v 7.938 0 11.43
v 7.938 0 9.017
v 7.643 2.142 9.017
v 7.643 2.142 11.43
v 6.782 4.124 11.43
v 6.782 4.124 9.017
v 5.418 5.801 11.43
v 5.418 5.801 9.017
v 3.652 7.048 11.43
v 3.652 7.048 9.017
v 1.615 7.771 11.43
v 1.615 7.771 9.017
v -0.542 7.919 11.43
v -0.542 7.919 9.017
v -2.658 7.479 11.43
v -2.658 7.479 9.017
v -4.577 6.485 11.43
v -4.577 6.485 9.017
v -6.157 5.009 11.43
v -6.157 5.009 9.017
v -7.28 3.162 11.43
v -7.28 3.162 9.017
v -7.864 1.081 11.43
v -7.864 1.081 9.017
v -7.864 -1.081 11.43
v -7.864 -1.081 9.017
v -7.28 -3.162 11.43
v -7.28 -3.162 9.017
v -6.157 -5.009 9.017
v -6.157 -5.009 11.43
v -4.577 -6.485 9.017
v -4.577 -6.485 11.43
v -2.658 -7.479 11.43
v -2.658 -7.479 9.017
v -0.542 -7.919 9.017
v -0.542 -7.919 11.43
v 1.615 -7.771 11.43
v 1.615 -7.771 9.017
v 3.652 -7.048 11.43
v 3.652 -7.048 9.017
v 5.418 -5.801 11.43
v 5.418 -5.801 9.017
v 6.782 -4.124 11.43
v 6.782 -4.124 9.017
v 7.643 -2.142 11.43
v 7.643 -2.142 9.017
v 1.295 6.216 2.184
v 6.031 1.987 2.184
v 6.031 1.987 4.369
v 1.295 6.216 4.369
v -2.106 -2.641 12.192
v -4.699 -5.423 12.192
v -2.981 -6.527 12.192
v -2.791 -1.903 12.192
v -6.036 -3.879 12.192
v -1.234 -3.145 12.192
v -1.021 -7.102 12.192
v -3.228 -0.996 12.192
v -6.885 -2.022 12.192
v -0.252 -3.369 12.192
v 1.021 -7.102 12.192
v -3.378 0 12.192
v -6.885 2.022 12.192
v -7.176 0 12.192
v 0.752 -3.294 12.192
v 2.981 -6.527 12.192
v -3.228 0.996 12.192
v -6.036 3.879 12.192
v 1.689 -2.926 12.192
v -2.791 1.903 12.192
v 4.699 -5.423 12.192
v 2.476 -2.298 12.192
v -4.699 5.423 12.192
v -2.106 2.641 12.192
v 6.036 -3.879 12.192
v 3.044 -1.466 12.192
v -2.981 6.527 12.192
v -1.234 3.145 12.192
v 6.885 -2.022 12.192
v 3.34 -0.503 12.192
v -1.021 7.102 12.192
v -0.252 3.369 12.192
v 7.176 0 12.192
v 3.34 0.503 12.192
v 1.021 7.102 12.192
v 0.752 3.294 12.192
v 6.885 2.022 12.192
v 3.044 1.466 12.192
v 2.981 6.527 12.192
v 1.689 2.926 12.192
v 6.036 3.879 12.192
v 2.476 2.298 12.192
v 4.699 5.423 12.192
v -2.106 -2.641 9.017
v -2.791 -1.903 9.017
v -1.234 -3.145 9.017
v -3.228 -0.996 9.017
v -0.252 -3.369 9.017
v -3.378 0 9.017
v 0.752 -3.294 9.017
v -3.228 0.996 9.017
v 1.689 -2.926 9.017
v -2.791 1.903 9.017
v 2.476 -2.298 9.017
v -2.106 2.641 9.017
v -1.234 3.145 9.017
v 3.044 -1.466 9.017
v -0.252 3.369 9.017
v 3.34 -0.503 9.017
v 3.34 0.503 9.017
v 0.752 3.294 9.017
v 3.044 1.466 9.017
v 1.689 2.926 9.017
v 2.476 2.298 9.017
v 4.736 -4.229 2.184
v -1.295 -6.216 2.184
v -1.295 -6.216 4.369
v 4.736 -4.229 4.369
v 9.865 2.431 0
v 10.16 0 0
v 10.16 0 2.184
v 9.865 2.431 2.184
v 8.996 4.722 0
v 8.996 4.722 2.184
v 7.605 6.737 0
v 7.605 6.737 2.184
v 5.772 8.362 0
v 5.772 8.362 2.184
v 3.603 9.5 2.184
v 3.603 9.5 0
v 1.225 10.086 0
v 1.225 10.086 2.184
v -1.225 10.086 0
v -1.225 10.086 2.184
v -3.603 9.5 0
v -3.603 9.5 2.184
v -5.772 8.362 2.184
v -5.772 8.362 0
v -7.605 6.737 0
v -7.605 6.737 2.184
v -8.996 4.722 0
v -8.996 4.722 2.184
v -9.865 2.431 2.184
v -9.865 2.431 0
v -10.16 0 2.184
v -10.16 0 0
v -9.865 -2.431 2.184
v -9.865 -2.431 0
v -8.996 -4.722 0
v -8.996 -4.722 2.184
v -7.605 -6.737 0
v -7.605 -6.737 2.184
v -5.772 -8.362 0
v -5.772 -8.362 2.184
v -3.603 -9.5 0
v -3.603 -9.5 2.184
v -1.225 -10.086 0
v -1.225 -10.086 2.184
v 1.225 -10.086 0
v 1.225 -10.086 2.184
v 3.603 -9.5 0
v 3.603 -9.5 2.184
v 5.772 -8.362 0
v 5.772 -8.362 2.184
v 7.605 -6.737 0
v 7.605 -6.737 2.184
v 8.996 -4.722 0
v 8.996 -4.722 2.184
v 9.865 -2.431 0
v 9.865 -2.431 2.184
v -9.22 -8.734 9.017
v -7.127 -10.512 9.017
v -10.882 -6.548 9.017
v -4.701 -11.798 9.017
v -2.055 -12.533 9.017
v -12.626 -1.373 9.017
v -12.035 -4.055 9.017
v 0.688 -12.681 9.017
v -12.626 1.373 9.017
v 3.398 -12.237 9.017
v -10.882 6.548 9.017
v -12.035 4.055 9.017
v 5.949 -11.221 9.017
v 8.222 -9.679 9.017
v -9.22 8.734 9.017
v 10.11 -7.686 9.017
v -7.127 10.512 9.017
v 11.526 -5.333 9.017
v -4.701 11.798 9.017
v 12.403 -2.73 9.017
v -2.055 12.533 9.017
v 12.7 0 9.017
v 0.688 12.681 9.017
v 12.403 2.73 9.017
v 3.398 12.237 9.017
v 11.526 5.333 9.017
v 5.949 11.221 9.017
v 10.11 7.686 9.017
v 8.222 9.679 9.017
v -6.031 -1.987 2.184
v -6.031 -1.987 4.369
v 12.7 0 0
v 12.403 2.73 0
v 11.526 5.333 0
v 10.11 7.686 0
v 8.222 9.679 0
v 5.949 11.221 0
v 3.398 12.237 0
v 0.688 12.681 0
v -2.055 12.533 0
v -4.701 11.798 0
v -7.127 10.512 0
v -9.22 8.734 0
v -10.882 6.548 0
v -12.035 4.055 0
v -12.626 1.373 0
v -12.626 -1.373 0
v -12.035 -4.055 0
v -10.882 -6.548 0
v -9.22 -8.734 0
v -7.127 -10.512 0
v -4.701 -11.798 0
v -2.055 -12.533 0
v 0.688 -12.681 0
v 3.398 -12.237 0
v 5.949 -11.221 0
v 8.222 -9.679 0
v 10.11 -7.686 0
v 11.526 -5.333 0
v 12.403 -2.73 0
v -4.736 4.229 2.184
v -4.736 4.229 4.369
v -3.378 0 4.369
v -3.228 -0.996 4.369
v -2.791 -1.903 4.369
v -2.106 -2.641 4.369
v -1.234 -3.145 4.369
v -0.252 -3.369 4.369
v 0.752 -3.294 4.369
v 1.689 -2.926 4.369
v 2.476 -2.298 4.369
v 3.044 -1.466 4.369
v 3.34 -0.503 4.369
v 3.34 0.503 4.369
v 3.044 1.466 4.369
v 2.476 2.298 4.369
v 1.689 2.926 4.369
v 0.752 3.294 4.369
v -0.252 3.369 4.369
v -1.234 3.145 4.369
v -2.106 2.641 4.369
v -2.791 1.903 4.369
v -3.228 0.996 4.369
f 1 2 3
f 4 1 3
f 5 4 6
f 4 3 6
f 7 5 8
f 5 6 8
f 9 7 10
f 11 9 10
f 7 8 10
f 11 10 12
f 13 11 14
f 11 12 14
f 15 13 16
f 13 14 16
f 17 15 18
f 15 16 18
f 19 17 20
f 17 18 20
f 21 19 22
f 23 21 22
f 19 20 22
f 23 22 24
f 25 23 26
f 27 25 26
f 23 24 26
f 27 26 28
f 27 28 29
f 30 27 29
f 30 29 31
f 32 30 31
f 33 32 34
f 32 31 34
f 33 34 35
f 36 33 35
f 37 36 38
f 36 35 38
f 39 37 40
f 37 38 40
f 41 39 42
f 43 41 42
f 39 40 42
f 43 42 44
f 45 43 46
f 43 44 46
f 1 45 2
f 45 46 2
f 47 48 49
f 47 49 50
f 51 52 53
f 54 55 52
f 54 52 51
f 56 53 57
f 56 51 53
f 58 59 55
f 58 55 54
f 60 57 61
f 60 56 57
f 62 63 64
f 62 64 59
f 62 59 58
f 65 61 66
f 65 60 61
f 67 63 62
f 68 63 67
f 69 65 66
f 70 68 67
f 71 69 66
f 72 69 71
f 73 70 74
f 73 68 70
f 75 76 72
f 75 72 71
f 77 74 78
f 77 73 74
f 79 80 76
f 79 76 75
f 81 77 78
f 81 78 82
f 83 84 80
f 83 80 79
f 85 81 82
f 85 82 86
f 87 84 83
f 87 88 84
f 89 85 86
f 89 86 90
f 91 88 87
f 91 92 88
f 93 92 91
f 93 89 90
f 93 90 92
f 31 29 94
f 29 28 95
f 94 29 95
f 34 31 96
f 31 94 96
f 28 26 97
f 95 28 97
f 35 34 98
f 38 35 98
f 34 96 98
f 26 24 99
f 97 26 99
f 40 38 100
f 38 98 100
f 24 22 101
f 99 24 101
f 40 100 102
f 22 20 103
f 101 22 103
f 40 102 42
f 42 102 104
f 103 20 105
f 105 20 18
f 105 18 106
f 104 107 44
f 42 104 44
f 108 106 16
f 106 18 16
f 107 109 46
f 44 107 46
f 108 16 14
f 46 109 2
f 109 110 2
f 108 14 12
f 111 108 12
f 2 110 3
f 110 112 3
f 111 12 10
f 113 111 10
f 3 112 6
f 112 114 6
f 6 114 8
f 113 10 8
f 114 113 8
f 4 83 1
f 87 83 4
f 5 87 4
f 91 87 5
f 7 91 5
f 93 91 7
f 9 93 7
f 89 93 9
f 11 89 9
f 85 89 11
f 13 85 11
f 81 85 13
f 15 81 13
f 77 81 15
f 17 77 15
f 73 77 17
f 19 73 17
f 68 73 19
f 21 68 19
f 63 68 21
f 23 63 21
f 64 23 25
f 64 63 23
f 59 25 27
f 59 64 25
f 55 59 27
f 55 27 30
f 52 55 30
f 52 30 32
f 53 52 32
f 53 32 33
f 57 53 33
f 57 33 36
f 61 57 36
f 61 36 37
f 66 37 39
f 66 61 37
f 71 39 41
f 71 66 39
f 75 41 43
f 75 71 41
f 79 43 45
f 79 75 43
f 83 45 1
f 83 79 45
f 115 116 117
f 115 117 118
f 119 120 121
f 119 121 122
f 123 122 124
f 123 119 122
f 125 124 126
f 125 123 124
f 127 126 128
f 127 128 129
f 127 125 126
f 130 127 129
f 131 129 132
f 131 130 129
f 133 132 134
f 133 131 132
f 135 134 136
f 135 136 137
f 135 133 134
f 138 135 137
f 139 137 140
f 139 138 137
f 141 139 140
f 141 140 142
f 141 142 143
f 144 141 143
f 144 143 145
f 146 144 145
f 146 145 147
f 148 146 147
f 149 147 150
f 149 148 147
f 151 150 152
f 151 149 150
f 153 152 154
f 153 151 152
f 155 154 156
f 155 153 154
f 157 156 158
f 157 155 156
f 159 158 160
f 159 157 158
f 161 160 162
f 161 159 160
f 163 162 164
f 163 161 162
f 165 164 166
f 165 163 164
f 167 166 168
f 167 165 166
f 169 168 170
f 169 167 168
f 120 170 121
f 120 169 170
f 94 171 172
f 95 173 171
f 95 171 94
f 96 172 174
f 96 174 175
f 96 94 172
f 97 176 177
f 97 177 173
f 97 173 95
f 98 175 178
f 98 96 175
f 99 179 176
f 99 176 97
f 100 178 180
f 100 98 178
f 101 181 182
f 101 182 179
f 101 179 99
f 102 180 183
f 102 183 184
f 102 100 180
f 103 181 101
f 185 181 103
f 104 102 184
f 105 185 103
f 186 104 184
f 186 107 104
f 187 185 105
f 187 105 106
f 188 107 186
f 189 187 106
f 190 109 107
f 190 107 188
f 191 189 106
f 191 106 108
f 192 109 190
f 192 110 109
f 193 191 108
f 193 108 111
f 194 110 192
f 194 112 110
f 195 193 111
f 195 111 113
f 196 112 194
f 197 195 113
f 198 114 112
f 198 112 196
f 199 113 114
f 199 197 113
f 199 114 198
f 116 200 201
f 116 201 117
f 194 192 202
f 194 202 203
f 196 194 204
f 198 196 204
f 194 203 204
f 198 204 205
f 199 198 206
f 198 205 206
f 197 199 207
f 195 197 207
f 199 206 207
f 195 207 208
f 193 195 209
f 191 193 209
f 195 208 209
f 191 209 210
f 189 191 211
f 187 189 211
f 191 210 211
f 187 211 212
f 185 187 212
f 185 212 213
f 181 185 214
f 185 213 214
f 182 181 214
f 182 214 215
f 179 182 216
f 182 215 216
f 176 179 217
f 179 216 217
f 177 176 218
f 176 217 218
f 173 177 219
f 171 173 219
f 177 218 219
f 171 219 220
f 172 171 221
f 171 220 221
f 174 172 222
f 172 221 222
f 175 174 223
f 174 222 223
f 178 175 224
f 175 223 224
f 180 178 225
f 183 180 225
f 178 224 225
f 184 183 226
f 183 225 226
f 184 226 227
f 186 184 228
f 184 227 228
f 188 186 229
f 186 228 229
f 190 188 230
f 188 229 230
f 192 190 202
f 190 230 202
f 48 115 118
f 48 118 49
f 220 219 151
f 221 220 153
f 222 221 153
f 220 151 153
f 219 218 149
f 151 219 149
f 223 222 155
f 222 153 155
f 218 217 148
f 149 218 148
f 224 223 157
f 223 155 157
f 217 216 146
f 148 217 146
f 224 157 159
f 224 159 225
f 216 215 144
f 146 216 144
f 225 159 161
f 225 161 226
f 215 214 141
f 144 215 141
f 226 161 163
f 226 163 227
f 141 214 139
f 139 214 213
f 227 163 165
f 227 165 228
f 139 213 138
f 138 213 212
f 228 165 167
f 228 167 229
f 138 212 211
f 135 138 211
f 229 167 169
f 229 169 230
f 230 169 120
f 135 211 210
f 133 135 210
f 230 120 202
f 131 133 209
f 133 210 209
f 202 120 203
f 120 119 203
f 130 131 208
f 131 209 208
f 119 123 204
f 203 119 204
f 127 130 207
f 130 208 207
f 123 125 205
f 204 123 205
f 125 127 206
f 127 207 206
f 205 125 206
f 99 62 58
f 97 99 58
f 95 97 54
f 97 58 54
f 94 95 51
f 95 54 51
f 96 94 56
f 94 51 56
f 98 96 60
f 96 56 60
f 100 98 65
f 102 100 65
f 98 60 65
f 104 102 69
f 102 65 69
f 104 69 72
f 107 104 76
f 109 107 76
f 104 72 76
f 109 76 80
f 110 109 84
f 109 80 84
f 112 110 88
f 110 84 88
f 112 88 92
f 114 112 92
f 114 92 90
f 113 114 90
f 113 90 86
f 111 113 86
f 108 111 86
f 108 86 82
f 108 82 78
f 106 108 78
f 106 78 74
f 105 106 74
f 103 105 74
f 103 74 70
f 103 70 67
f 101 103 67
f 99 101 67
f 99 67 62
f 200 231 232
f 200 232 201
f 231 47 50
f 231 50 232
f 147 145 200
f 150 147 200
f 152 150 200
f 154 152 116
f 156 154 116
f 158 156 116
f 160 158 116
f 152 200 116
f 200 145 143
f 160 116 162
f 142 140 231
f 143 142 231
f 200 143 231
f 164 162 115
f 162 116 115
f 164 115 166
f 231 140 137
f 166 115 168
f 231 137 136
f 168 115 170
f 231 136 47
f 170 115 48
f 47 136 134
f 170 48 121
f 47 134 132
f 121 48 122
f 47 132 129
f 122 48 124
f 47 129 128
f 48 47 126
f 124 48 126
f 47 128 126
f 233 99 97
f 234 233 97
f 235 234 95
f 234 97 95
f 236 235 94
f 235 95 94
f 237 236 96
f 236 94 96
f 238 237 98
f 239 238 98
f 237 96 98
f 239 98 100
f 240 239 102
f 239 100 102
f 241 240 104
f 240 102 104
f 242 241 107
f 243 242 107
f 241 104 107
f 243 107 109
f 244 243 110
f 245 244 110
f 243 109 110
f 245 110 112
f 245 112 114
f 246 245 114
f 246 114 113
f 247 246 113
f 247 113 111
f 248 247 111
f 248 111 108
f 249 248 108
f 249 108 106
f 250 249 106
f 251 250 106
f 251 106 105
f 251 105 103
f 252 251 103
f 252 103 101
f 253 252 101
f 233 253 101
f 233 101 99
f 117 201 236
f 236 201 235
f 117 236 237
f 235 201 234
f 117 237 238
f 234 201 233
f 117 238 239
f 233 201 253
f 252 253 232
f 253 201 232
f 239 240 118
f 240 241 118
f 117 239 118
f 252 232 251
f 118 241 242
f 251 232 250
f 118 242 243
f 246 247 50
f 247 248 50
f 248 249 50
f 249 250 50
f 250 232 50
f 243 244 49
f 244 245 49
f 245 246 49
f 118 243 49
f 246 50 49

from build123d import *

# Parameters (mm, degrees)
F0_R     = 12.7
F1_DEPTH = 9.017
F2_R     = 7.9375
F3_DEPTH = 3.175
F4_SIZE  = 0.762
F5_R     = 10.16
F6_DEPTH = 2.1844
F8_DEPTH = 4.3688
F9_D     = 6.7564
F9_2_D   = 6.7564


with BuildPart() as f1:
    # F0 (on Top) → F1 (new body)
    with BuildSketch(Plane.XY):
        Circle(F0_R)
    extrude(amount=F1_DEPTH)

    # F5 (on face) → F6 (cut)
    with BuildSketch(Plane.XY):
        Circle(F5_R)
    extrude(amount=F6_DEPTH, mode=Mode.SUBTRACT)

    # F7 (on face) → F8 (cut)
    with BuildSketch(Plane.XY):
        Polygon((6.030932, 1.986955), (1.294713, 6.216418), (-4.736219, 4.229463), (-6.030932, -1.986955), (-1.294713, -6.216418), (4.736219, -4.229463), align=None)
    extrude(amount=F8_DEPTH, mode=Mode.SUBTRACT)

    # F9 (through all)
    with Locations(Plane(origin=(0, 0, 0), x_dir=(1, 0, 0), z_dir=(0, 0, -1))):
        with Locations((0, 0)):
            Hole(F9_D / 2)


with BuildPart() as f3:
    # F2 (on face) → F3 (new body)
    with BuildSketch(Plane.XY.offset(9.017)):
        Circle(F2_R)
    extrude(amount=F3_DEPTH)

    # F4
    f4_edges = [f3.edges().sort_by_distance(p)[0] for p in [
        (-7.9375, 0, 12.192),
    ]]
    chamfer(f4_edges, length=F4_SIZE)

    # F9#2 (through all)
    with Locations(Plane(origin=(0, 0, 0), x_dir=(1, 0, 0), z_dir=(0, 0, -1))):
        with Locations((0, 0)):
            Hole(F9_2_D / 2)


solid = Compound([f1.part, f3.part])
